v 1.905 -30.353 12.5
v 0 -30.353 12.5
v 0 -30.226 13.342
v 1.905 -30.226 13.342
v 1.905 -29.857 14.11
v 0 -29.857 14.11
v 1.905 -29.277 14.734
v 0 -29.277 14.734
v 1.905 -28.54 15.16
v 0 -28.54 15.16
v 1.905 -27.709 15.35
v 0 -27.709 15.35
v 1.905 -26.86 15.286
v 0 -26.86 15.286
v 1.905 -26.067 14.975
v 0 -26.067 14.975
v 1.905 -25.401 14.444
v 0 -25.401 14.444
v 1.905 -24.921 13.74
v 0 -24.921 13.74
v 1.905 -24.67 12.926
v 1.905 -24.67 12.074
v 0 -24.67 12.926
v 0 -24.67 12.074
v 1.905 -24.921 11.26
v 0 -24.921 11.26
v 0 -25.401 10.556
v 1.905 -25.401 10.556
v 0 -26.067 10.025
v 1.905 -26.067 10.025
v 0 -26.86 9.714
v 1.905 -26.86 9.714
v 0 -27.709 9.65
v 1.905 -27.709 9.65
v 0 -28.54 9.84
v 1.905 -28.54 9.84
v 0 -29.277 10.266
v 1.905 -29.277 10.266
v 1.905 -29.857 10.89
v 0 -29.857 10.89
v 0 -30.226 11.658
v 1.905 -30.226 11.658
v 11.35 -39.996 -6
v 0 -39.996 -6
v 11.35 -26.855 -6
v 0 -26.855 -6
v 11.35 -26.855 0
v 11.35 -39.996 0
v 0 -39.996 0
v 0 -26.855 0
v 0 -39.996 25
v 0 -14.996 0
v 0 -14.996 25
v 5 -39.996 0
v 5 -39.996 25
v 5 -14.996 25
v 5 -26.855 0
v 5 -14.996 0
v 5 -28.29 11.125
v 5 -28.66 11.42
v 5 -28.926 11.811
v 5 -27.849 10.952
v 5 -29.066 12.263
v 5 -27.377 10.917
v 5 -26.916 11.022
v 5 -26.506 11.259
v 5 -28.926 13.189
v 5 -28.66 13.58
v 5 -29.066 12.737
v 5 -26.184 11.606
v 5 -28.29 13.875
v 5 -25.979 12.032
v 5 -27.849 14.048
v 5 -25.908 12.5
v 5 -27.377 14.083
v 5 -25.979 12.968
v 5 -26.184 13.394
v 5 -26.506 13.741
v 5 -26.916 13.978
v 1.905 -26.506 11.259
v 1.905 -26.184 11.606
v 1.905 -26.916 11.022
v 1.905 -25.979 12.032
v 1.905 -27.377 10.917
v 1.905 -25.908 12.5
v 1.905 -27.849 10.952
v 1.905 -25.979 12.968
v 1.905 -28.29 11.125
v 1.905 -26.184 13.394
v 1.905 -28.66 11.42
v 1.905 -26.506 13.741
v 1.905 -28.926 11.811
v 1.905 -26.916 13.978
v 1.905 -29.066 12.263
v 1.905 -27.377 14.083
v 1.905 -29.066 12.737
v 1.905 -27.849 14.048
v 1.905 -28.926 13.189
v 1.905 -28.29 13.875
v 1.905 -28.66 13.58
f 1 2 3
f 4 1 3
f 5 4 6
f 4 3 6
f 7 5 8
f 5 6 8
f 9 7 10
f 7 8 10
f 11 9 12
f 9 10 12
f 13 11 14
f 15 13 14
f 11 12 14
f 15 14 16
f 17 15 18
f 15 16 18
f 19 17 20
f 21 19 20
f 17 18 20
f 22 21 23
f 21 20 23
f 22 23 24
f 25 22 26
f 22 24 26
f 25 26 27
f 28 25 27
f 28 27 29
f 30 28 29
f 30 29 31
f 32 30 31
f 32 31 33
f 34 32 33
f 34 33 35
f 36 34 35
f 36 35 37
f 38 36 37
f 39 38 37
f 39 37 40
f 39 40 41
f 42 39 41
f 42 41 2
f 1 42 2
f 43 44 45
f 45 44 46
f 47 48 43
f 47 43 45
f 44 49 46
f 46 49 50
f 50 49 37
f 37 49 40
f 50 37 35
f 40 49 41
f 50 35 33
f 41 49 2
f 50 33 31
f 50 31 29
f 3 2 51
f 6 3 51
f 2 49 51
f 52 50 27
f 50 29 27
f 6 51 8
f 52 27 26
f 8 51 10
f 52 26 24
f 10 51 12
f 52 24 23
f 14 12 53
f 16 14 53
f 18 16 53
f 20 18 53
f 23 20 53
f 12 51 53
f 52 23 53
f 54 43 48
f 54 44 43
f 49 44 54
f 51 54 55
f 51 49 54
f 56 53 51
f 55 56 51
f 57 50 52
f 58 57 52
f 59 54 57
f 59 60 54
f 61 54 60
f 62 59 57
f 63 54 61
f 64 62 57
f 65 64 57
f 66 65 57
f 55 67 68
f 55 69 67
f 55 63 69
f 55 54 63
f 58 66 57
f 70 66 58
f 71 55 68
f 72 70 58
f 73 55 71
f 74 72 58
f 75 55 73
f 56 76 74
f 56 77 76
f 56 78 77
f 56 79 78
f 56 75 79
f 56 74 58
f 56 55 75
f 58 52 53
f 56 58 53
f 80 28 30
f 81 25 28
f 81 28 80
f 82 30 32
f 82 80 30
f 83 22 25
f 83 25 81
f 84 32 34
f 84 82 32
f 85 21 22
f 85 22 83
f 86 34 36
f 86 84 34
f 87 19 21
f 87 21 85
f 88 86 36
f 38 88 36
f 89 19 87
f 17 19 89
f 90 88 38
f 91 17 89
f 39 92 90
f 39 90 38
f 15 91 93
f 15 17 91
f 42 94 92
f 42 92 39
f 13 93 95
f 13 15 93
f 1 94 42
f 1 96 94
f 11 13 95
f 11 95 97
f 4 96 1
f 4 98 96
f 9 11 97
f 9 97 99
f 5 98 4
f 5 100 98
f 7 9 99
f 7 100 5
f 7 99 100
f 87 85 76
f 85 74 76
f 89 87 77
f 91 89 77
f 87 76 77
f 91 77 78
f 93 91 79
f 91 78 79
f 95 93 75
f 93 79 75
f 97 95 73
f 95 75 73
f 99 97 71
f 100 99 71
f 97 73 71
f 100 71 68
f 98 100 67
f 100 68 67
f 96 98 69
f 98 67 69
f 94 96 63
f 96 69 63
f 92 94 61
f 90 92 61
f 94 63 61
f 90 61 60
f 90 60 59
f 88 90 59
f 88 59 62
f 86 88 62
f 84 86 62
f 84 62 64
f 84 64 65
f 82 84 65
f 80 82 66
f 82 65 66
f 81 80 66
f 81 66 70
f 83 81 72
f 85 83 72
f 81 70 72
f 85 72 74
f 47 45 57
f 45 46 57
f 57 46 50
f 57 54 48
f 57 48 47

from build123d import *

# Parameters (mm, degrees)
F0_W           = 13.1409592241
F0_H           = 6
F1_DEPTH       = 5
F3_D           = 3.175
F3_CBORE_D     = 5.715
F3_CBORE_DEPTH = 1.905
F4_W           = 13.1409592241
F4_H           = 6
F5_DEPTH       = 6.35


with BuildPart() as f1:
    # F0 (on Right) → F1 (new body)
    with BuildSketch(Plane.YZ):
        with Locations((-33.4253355518, -3)):
            Rectangle(F0_W, F0_H)
        Polygon((-14.9958151639, 25), (-39.9958151639, 25), (-39.9958151639, 0), (-26.8548559397, 0), (-14.9958151639, 0), align=None)
    extrude(amount=F1_DEPTH)

    # F3 (through all)
    with Locations(Plane(origin=(0, 0, 0), x_dir=(0, -1, 0), z_dir=(-1, 0, 0))):
        with Locations((27.4958151639, 12.5)):
            CounterBoreHole(F3_D / 2, F3_CBORE_D / 2, F3_CBORE_DEPTH)

    # F4 (on face) → F5 (join)
    with BuildSketch(Plane.YZ.offset(5)):
        with Locations((-33.4253355518, -3)):
            Rectangle(F4_W, F4_H)
    extrude(amount=F5_DEPTH)


solid = f1.part
